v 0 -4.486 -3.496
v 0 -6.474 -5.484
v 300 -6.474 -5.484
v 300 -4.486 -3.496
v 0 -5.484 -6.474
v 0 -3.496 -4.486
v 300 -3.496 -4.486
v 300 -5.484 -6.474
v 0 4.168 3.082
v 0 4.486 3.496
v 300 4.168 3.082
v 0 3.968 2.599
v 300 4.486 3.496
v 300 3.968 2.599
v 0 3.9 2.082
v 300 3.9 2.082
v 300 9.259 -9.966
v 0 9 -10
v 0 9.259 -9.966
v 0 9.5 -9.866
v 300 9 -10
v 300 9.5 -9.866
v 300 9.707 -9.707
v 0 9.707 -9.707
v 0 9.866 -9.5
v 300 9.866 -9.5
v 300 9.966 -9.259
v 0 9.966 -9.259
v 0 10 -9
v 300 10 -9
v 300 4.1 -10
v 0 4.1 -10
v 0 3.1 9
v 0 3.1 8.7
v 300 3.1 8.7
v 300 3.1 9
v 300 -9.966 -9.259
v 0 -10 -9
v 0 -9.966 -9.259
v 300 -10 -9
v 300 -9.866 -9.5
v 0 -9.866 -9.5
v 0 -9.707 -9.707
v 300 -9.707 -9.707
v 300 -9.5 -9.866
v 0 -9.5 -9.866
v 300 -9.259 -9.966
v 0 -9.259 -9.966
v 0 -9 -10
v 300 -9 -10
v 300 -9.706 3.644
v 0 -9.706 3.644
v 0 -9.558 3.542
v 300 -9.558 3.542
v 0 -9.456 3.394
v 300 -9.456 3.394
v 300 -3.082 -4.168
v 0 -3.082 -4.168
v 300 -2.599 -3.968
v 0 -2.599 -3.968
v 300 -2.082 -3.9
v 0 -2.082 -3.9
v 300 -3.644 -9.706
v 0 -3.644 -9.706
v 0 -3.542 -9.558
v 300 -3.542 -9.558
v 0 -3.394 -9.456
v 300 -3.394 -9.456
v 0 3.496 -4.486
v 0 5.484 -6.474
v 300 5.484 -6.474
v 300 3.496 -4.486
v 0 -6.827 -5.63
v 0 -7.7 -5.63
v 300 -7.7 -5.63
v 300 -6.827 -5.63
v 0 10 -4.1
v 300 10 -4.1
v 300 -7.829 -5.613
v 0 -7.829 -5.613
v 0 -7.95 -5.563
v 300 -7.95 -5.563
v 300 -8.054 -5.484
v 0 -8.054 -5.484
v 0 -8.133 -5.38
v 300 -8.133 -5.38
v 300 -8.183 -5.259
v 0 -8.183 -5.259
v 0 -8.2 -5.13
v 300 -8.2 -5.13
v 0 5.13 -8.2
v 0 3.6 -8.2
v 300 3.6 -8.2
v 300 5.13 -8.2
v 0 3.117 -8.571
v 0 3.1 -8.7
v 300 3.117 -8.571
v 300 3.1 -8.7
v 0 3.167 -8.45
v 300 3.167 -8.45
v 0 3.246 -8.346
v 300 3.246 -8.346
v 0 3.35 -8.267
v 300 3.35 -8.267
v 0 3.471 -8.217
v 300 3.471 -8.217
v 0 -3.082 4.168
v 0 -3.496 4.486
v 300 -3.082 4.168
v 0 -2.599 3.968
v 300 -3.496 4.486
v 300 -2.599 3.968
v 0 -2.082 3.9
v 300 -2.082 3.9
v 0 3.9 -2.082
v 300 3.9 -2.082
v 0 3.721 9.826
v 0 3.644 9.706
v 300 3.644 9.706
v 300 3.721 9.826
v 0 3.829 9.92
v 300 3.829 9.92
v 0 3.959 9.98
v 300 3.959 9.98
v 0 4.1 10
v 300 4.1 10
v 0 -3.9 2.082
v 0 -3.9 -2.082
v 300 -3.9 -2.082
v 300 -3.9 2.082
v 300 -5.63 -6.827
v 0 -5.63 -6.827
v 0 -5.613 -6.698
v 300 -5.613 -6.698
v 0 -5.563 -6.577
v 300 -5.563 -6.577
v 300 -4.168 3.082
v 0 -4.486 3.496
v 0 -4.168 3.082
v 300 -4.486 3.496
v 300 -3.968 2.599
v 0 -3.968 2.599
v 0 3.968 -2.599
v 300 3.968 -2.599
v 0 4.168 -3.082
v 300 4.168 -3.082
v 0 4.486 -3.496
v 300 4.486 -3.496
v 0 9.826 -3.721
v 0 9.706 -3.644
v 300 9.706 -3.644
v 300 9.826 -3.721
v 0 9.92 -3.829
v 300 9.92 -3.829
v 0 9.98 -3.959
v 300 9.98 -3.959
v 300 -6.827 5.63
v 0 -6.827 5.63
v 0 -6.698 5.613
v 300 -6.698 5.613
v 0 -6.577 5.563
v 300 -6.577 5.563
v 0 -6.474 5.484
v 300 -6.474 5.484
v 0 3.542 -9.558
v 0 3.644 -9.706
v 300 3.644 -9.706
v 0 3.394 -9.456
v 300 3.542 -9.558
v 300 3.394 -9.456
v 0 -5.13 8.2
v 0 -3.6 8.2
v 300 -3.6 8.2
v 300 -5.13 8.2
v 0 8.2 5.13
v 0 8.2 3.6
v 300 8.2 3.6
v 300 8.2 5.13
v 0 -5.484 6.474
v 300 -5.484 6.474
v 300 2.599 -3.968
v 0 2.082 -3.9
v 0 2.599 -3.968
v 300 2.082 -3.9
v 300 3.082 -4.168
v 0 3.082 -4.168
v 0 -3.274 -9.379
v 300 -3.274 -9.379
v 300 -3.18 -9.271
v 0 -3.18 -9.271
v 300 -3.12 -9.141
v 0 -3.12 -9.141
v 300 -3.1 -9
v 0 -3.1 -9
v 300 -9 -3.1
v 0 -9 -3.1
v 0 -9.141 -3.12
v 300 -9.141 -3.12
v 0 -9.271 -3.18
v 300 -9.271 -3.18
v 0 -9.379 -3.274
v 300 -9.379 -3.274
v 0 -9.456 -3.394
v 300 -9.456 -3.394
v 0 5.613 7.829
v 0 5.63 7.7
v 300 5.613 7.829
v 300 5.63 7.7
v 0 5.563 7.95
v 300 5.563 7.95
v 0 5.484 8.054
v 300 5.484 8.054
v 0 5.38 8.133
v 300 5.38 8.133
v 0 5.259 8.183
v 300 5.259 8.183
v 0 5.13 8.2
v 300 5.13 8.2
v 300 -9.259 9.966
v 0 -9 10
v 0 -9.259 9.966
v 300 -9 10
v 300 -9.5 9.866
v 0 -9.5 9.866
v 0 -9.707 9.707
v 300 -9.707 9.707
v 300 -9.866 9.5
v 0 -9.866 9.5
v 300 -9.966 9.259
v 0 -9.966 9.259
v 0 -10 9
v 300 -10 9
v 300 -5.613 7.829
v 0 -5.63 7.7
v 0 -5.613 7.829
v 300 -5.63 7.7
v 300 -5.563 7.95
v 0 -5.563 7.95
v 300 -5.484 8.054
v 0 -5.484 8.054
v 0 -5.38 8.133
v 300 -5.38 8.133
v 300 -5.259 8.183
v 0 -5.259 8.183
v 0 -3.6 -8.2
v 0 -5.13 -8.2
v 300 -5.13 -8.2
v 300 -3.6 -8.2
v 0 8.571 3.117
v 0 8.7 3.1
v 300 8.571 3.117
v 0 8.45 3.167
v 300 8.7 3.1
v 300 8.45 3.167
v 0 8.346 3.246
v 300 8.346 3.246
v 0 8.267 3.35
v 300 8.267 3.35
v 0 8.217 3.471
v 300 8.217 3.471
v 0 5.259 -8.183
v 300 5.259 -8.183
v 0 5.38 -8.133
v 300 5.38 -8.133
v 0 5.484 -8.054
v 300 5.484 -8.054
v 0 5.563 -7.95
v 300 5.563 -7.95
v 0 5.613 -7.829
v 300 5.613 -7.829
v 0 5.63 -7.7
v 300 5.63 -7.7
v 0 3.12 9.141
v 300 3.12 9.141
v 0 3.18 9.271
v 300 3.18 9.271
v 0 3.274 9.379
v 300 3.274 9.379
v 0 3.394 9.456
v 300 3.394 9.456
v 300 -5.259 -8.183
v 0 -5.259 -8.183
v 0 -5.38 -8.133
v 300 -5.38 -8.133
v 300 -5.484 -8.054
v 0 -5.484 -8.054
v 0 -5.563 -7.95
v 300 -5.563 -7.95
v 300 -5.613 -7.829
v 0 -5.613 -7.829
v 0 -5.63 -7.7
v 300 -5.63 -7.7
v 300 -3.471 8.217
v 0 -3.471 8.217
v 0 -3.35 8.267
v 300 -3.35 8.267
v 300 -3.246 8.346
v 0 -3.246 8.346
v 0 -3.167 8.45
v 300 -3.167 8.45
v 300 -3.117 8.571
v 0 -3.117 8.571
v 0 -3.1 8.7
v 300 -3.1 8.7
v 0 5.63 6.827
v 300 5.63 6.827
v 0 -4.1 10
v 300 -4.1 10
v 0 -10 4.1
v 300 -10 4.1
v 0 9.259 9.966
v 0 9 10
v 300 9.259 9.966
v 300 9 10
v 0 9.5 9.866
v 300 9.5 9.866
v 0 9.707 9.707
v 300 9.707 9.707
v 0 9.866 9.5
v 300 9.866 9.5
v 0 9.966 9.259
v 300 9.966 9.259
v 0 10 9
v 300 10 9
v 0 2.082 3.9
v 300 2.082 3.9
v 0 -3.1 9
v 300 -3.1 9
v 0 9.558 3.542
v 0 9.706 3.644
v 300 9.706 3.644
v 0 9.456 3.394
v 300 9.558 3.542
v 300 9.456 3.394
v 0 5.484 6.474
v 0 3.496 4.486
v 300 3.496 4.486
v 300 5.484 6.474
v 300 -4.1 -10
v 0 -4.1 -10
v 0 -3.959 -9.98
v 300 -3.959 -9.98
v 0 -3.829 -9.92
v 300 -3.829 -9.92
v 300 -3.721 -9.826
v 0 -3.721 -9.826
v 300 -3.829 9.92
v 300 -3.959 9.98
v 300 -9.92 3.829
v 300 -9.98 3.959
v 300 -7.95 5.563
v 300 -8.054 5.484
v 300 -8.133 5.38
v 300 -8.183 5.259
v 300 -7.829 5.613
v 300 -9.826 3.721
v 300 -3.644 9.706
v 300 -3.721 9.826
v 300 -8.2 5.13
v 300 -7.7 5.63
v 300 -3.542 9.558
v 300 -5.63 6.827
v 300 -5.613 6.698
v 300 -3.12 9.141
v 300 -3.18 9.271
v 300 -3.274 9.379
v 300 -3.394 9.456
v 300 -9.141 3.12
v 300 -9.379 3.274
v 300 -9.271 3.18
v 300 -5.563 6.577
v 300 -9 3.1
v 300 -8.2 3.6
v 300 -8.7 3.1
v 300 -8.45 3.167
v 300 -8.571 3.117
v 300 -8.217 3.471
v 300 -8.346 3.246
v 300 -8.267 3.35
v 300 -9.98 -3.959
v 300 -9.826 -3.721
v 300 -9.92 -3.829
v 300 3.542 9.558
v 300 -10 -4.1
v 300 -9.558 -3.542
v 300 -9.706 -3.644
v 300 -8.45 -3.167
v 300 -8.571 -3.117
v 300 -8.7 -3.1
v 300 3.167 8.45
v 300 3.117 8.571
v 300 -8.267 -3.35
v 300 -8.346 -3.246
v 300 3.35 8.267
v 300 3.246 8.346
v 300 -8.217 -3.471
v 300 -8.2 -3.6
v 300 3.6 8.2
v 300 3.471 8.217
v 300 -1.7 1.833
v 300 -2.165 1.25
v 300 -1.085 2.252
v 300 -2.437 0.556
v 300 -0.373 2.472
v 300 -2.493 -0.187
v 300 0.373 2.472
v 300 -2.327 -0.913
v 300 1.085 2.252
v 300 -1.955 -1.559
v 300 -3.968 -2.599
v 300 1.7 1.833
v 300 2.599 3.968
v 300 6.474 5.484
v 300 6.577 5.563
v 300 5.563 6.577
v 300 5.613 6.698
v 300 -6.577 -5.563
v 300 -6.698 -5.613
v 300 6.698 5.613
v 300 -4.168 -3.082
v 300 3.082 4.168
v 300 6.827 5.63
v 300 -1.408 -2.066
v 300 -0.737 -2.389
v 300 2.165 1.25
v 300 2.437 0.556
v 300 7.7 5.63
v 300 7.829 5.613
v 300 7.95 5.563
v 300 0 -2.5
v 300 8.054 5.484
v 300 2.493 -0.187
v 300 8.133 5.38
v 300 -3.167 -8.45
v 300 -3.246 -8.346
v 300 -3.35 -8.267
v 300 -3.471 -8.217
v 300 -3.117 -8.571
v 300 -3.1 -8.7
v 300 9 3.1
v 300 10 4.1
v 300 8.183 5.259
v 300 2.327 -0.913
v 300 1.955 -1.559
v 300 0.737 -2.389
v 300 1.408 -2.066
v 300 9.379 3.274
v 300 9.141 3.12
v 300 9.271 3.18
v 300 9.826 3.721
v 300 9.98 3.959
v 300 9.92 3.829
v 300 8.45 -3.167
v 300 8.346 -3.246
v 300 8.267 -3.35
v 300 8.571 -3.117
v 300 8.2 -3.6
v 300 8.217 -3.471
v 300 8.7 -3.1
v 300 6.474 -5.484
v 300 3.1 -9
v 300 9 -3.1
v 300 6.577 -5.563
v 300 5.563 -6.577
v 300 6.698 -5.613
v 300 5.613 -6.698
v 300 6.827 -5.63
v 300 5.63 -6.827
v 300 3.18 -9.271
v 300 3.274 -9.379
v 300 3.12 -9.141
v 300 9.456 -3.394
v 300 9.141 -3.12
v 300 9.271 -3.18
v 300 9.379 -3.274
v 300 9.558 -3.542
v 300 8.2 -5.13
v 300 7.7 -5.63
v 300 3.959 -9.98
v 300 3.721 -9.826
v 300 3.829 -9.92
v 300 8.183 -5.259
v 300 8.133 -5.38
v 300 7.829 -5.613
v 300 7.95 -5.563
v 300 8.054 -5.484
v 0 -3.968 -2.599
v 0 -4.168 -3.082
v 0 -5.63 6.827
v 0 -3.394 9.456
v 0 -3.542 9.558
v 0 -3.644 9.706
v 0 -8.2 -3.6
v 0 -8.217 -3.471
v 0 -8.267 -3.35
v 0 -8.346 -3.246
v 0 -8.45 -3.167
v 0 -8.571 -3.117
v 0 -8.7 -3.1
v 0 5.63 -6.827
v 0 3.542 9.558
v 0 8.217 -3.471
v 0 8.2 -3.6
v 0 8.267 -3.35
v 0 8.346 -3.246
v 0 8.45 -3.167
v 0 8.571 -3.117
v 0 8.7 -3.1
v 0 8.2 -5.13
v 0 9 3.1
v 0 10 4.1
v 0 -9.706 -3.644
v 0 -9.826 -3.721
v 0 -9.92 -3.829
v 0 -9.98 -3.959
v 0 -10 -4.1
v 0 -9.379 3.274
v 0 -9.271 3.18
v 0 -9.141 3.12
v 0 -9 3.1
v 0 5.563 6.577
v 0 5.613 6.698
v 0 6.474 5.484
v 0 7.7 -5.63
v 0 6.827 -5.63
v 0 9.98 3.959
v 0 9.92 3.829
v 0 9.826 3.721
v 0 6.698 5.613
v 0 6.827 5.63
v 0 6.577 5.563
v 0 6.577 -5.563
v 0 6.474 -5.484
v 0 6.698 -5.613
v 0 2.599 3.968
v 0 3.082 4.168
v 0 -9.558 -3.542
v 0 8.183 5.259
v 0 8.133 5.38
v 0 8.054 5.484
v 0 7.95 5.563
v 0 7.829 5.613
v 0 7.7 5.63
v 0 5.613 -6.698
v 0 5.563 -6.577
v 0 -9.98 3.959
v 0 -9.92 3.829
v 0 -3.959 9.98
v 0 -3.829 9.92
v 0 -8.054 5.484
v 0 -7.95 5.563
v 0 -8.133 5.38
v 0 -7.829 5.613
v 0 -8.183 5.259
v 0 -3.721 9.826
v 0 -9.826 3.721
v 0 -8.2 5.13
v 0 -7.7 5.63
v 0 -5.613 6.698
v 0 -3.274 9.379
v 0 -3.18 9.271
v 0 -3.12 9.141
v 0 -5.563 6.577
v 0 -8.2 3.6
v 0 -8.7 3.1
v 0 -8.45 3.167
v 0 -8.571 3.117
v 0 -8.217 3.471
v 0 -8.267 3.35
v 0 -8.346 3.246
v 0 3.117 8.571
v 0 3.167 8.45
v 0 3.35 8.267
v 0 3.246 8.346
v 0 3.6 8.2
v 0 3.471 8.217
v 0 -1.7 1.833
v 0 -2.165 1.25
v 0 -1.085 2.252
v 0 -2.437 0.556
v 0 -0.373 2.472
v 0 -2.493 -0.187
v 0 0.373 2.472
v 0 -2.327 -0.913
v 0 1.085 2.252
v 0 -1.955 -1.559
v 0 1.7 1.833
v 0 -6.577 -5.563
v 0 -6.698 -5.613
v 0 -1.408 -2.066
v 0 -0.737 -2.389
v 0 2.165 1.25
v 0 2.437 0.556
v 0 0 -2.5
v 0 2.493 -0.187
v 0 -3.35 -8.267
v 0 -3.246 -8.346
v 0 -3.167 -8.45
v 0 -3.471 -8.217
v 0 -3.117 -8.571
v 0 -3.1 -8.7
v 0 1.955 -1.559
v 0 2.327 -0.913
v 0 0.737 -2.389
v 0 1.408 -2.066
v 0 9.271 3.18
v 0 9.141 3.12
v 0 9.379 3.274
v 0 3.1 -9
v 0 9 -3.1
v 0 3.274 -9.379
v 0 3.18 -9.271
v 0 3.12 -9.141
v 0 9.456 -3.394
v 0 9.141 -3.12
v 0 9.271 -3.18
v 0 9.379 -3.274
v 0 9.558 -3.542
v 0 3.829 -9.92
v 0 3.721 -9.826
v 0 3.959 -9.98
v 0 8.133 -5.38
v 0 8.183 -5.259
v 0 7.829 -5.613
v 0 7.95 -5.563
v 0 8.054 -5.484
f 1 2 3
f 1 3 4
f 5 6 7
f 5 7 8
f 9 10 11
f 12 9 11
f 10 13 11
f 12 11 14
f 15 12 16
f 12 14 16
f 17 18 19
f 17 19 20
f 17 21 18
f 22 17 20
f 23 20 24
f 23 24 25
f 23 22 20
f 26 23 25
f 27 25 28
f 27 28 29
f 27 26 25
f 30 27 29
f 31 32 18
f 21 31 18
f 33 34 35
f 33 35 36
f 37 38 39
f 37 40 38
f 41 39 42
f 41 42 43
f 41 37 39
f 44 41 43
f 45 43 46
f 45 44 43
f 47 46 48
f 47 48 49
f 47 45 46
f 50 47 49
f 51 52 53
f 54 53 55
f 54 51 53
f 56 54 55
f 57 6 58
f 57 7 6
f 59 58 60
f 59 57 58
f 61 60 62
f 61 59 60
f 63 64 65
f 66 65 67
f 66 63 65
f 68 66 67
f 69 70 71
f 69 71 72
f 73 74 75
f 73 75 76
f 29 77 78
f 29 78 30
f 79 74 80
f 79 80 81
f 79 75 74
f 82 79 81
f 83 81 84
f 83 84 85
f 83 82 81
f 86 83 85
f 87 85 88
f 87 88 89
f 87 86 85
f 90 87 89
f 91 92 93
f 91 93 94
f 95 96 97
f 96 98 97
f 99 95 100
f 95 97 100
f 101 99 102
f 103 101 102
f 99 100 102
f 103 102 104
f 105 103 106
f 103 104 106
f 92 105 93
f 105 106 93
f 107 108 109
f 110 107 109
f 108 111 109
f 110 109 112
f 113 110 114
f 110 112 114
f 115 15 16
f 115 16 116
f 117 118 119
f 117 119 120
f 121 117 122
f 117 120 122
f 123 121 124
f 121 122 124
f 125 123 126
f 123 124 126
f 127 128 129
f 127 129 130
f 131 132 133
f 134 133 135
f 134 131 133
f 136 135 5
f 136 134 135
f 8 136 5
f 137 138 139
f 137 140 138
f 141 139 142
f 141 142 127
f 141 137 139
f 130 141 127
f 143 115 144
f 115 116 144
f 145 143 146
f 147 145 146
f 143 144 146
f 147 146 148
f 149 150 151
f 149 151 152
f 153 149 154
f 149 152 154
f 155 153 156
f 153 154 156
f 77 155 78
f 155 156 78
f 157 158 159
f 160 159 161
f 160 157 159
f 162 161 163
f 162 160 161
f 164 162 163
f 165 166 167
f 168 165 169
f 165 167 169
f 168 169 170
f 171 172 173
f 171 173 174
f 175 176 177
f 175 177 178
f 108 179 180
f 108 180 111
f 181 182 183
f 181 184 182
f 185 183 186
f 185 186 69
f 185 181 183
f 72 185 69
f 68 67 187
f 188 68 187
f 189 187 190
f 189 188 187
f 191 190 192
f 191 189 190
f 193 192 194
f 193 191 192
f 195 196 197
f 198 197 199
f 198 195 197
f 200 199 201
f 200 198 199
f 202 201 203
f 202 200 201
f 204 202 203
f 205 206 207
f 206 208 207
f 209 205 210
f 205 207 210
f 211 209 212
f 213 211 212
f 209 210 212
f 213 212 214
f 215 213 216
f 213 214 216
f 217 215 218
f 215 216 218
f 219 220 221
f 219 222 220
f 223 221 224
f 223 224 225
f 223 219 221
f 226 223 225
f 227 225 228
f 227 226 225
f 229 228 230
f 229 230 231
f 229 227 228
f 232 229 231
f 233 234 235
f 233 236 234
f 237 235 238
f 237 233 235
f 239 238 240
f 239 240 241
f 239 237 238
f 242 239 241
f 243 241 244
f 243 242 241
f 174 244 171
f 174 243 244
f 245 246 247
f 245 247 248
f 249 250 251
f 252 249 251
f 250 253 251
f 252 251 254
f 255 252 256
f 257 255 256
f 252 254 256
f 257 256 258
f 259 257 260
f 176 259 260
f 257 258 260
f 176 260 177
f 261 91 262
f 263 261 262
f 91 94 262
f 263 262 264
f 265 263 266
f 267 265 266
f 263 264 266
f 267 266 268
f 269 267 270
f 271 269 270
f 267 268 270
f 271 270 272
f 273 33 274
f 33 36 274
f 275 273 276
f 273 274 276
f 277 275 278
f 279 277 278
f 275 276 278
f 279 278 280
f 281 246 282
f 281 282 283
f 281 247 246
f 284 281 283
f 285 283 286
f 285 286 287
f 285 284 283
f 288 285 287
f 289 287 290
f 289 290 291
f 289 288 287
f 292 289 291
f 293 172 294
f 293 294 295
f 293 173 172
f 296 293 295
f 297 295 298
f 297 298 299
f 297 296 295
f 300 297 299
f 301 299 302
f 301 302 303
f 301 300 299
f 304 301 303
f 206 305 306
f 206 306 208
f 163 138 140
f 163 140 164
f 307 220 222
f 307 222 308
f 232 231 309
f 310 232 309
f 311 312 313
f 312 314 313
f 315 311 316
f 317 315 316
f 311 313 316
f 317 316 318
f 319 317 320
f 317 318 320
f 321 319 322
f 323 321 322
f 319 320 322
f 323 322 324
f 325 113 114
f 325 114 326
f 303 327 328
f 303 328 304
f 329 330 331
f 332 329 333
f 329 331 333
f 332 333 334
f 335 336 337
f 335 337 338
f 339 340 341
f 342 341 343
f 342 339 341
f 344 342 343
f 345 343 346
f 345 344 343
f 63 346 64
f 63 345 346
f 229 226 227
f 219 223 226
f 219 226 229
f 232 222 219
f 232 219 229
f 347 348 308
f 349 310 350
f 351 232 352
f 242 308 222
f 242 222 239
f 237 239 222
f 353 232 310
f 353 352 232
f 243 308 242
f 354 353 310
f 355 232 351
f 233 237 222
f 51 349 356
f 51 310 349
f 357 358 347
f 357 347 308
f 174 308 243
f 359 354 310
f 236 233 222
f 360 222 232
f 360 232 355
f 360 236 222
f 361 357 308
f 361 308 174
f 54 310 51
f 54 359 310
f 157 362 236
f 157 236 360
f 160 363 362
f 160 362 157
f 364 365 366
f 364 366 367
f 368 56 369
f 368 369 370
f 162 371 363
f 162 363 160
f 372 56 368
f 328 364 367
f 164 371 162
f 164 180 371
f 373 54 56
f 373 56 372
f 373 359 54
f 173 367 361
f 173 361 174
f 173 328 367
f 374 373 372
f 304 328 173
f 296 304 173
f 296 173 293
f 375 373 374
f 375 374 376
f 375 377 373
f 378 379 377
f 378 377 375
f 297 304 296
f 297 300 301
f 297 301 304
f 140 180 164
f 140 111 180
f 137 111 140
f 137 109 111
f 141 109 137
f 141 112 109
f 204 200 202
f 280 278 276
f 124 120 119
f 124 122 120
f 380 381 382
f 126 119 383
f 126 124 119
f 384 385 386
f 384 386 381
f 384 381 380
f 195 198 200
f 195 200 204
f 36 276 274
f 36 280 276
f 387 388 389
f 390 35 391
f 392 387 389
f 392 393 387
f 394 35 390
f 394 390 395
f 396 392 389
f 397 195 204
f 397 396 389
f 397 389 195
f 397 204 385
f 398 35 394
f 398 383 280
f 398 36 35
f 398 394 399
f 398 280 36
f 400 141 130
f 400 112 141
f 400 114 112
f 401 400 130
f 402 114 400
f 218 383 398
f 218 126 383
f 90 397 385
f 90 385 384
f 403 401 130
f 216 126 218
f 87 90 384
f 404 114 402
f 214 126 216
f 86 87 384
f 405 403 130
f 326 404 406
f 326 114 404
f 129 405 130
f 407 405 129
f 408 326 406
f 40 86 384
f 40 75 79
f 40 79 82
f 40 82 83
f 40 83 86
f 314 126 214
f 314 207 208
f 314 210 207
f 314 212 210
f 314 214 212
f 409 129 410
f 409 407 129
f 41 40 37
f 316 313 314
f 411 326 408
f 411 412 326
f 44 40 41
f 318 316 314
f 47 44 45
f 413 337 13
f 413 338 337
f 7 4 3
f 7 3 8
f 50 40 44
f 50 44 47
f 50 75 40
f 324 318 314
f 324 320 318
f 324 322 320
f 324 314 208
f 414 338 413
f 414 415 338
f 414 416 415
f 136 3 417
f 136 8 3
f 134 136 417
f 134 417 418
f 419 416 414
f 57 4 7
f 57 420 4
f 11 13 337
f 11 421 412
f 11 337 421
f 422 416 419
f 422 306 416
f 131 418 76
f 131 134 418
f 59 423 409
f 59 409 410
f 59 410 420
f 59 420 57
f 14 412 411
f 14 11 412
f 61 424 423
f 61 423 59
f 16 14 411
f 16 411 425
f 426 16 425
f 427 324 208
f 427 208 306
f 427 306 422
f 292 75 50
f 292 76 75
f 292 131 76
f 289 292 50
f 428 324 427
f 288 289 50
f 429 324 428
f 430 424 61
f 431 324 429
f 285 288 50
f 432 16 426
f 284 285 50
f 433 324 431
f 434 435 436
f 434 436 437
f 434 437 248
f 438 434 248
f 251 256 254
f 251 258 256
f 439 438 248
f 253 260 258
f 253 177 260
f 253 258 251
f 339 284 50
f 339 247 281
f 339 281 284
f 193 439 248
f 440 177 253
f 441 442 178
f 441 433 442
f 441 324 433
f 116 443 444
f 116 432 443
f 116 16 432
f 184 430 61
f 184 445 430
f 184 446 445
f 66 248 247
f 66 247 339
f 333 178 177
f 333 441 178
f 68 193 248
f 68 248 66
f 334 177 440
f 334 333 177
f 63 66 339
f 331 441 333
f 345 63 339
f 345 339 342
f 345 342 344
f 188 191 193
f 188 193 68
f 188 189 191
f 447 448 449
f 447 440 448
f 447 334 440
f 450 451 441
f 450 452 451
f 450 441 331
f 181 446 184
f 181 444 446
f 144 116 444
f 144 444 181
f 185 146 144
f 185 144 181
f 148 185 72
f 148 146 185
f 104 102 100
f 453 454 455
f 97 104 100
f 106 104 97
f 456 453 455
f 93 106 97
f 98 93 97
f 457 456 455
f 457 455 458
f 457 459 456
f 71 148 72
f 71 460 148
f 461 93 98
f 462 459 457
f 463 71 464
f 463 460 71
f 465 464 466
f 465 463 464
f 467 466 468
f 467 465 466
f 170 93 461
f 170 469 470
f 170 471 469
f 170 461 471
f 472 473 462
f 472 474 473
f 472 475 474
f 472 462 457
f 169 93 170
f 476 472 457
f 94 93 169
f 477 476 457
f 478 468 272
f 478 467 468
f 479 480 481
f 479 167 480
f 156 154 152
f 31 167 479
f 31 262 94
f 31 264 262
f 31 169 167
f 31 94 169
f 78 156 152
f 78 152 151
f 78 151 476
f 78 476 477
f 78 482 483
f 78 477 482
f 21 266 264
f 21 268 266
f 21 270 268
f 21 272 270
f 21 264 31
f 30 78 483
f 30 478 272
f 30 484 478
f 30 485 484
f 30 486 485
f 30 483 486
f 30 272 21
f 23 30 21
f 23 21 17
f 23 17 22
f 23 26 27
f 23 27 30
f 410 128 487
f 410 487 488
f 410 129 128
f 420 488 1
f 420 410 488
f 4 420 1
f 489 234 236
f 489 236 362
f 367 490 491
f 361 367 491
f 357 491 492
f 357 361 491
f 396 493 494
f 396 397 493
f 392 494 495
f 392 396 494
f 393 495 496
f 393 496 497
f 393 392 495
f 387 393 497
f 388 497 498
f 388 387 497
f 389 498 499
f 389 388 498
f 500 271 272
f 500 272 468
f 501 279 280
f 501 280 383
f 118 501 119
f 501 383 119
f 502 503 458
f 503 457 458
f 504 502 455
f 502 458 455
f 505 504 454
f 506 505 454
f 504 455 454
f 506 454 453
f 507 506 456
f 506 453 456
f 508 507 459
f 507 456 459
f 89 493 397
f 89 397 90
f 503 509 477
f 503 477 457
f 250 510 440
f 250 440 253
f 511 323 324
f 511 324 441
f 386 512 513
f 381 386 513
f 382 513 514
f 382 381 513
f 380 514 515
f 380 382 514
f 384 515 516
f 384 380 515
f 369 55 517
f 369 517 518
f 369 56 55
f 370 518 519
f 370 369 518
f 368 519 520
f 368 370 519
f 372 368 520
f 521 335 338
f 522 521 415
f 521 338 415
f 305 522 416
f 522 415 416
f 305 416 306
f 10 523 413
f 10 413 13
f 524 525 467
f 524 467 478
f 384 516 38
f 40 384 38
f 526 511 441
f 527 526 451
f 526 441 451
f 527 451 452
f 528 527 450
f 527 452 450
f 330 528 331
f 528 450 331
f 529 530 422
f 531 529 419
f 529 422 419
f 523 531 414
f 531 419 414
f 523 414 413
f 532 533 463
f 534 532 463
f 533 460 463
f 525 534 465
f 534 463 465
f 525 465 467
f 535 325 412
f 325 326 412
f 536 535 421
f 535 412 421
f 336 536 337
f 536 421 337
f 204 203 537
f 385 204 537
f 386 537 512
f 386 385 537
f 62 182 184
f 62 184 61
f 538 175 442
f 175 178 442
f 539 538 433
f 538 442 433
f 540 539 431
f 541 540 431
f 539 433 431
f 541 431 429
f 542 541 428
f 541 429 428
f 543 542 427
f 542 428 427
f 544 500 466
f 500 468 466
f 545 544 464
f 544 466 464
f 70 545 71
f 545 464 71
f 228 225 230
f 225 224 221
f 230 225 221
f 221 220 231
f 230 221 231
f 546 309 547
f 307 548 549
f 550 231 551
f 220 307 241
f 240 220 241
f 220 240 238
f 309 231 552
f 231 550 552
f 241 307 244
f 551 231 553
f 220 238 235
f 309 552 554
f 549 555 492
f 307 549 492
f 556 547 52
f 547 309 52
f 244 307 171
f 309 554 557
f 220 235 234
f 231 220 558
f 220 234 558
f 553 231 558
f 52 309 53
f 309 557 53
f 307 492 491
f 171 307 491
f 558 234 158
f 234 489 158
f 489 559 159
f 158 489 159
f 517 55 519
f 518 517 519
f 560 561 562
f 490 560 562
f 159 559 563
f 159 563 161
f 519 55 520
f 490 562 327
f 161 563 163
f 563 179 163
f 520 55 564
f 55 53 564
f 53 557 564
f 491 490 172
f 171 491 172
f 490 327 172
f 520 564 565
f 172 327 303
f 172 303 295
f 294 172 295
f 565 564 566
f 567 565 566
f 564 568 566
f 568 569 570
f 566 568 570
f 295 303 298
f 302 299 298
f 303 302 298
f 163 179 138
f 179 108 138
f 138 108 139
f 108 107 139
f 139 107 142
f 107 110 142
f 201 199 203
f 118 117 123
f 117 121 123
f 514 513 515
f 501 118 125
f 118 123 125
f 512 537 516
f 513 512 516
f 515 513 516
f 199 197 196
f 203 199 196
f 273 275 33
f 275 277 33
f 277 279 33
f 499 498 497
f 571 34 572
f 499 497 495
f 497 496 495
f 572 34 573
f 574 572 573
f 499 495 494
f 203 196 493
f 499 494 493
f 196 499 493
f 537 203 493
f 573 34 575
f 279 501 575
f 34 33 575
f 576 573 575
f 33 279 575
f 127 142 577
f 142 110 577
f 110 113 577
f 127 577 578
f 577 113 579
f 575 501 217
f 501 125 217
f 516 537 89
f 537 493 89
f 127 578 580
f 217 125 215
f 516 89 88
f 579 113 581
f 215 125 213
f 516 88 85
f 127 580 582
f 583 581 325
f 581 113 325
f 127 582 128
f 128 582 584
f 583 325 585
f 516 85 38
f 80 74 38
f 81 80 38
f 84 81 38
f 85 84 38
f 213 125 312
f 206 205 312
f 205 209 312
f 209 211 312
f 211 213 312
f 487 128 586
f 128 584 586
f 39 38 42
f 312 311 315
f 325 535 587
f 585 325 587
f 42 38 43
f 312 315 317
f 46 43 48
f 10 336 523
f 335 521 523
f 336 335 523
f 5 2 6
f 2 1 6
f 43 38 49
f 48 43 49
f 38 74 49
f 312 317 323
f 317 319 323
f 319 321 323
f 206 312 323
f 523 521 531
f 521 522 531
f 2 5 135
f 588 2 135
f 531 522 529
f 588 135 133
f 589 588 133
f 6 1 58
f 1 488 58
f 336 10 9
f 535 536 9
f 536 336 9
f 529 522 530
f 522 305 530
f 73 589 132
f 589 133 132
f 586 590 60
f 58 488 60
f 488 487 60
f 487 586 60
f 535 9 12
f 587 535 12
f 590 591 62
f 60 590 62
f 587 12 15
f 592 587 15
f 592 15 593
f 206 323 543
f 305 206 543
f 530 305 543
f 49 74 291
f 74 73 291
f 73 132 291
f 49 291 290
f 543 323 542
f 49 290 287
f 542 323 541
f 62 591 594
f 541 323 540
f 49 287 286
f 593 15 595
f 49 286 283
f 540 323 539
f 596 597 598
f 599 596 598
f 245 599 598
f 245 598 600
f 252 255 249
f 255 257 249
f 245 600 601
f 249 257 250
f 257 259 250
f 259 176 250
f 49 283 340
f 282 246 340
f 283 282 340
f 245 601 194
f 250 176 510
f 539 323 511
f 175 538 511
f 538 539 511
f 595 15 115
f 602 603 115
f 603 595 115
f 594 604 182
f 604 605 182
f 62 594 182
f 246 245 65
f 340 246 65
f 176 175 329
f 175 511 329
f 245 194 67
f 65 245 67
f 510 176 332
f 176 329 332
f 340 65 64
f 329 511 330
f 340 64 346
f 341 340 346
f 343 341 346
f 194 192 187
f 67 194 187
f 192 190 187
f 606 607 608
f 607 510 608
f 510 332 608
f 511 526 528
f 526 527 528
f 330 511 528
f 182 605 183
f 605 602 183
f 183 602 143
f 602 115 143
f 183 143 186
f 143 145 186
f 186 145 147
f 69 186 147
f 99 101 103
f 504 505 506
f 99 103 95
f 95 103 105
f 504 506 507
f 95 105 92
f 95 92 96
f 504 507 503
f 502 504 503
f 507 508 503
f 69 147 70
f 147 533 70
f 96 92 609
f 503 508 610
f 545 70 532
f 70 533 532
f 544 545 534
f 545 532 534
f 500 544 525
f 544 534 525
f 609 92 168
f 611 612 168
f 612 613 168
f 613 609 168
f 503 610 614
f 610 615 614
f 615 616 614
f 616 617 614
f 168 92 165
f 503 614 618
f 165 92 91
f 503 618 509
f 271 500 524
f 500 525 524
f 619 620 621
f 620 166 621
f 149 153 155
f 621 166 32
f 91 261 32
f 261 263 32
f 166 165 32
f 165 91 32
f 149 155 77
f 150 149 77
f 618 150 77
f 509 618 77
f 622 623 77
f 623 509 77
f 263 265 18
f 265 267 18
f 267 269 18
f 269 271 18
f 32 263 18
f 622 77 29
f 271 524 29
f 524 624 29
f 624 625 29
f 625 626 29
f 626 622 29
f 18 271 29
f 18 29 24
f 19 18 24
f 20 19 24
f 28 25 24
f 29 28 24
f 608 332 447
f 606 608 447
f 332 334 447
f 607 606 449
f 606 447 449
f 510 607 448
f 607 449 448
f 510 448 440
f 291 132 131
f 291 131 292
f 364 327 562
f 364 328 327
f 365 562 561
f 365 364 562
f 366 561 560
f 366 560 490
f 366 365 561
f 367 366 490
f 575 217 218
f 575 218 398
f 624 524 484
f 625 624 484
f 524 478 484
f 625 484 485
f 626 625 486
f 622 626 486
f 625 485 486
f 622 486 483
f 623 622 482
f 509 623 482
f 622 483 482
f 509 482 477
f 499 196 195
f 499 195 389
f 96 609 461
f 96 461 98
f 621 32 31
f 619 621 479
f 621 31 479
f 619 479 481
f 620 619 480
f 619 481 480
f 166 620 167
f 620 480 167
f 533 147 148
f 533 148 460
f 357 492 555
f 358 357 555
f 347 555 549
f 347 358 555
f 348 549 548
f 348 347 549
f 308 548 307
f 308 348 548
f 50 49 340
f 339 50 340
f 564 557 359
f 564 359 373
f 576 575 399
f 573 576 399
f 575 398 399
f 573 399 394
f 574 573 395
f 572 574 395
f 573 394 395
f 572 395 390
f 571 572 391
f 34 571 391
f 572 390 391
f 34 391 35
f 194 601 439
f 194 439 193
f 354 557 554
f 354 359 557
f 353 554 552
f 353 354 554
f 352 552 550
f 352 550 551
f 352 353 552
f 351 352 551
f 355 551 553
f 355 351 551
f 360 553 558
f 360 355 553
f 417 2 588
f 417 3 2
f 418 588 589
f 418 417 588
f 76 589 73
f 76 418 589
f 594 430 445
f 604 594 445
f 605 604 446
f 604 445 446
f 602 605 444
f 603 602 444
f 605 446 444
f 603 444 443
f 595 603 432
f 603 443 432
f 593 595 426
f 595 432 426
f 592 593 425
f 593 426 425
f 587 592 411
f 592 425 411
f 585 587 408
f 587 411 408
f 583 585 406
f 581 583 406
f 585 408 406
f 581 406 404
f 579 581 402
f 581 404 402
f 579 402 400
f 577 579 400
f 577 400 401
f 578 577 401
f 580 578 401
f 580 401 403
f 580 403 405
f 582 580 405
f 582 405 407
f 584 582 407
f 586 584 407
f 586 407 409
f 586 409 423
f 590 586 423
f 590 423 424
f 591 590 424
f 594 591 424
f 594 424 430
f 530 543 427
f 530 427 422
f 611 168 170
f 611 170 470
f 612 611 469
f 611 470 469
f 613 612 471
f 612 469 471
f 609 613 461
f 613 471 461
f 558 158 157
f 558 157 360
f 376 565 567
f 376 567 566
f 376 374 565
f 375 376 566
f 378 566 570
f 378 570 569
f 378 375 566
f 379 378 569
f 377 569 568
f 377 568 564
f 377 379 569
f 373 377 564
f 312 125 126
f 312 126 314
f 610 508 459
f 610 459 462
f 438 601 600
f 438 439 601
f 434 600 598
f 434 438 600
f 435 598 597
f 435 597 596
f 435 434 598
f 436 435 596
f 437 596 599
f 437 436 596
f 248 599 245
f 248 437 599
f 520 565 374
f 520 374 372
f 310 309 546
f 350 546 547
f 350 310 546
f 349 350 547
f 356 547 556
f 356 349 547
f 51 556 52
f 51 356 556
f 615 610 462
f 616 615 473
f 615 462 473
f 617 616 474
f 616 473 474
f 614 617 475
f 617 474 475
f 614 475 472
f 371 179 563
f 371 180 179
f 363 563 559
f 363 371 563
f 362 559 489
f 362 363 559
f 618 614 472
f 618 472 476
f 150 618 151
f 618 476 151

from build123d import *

# Parameters (mm, degrees)
SKETCH1_W                = 20
SKETCH1_H                = 20
BOSS_EXTRUDE1_DEPTH      = 300
FILLET1_R                = 1
CUT_EXTRUDE1_DEPTH       = 301.333148354
F_5_0_5_DIAMETER_HOLE1_D = 5
FILLET2_R                = 2
FILLET3_R                = 0.5
FILLET4_R                = 0.5
FILLET5_R                = 0.5


with BuildPart() as part:
    # Sketch1 → Boss-Extrude1 (new body)
    with BuildSketch(Plane(origin=(0, 0, 0), x_dir=(0, 0, -1), z_dir=(1, 0, 0))):
        Rectangle(SKETCH1_W, SKETCH1_H)
    extrude(amount=BOSS_EXTRUDE1_DEPTH)

    # Fillet1
    fillet1_edges = [part.edges().sort_by_distance(p)[0] for p in [
        (150, 10, 10),
        (150, 10, -10),
        (150, -10, -10),
        (150, -10, 10),
    ]]
    fillet(fillet1_edges, radius=FILLET1_R)

    # Sketch3 → Cut-Extrude1 (cut, through all)
    with BuildSketch(Plane.ZY):
        Polygon((-3.6, 10), (3.6, 10), (3.6, 9.5), (3.1, 9.5), (3.1, 8.2), (5.63, 8.2), (5.63, 6.619949494), (2.910050506, 3.9), (-2.910050506, 3.9), (-5.63, 6.619949494), (-5.63, 8.2), (-3.1, 8.2), (-3.1, 9.5), (-3.6, 9.5), align=None)
        Polygon((10, 3.6), (10, -3.6), (9.5, -3.6), (9.5, -3.1), (8.2, -3.1), (8.2, -5.63), (6.619949494, -5.63), (3.9, -2.910050506), (3.9, 2.910050506), (6.619949494, 5.63), (8.2, 5.63), (8.2, 3.1), (9.5, 3.1), (9.5, 3.6), align=None)
        Polygon((3.6, -10), (-3.6, -10), (-3.6, -9.5), (-3.1, -9.5), (-3.1, -8.2), (-5.63, -8.2), (-5.63, -6.619949494), (-2.910050506, -3.9), (2.910050506, -3.9), (5.63, -6.619949494), (5.63, -8.2), (3.1, -8.2), (3.1, -9.5), (3.6, -9.5), align=None)
        Polygon((-10, -3.6), (-10, 3.6), (-9.5, 3.6), (-9.5, 3.1), (-8.2, 3.1), (-8.2, 5.63), (-6.619949494, 5.63), (-3.9, 2.910050506), (-3.9, -2.910050506), (-6.619949494, -5.63), (-8.2, -5.63), (-8.2, -3.1), (-9.5, -3.1), (-9.5, -3.6), align=None)
    extrude(amount=-CUT_EXTRUDE1_DEPTH, mode=Mode.SUBTRACT)

    # Ø5.0 (5) Diameter Hole1 (through all)
    with Locations(Plane.ZY):
        with Locations((0, 0)):
            Hole(F_5_0_5_DIAMETER_HOLE1_D / 2)

    # Fillet2
    fillet2_edges = [part.edges().sort_by_distance(p)[0] for p in [
        (150, -3.9, -2.910050506),
        (150, -3.9, 2.910050506),
        (150, 2.910050506, -3.9),
        (150, -2.910050506, -3.9),
        (150, -2.910050506, 3.9),
        (150, 2.910050506, 3.9),
        (150, 3.9, 2.910050506),
        (150, 3.9, -2.910050506),
    ]]
    fillet(fillet2_edges, radius=FILLET2_R)

    # Fillet3
    fillet3_edges = [part.edges().sort_by_distance(p)[0] for p in [
        (150, 3.6, -10),
        (150, 3.1, -9.5),
        (150, 3.1, -8.2),
        (150, 5.63, -8.2),
        (150, 5.63, -6.619949494),
        (150, 3.6, 10),
        (150, 3.1, 9.5),
        (150, 3.1, 8.2),
        (150, 5.63, 8.2),
        (150, 5.63, 6.619949494),
        (150, 6.619949494, 5.63),
        (150, 8.2, 5.63),
        (150, 8.2, 3.1),
        (150, 9.5, 3.1),
        (150, 10, 3.6),
        (150, 9.5, -3.1),
        (150, 10, -3.6),
        (150, 8.2, -3.1),
        (150, 8.2, -5.63),
        (150, 6.619949494, -5.63),
    ]]
    fillet(fillet3_edges, radius=FILLET3_R - 0.0001)  # a hair under: the kernel refuses the full size

    # Fillet4
    fillet4_edges = [part.edges().sort_by_distance(p)[0] for p in [
        (150, -3.6, 10),
        (150, -3.1, 9.5),
        (150, -3.1, 8.2),
        (150, -5.63, 8.2),
        (150, -5.63, 6.619949494),
        (150, -6.619949494, 5.63),
        (150, -8.2, 5.63),
        (150, -8.2, 3.1),
        (150, -10, 3.6),
        (150, -9.5, 3.1),
        (150, -10, -3.6),
        (150, -9.5, -3.1),
        (150, -8.2, -3.1),
        (150, -8.2, -5.63),
        (150, -6.619949494, -5.63),
        (150, -5.63, -6.619949494),
        (150, -5.63, -8.2),
        (150, -3.1, -8.2),
        (150, -3.1, -9.5),
        (150, -3.6, -10),
    ]]
    fillet(fillet4_edges, radius=FILLET4_R - 0.0001)  # a hair under: the kernel refuses the full size

    # Fillet5
    fillet5_edges = [part.edges().sort_by_distance(p)[0] for p in [
        (150, 3.6, 9.5),
        (150, 9.5, 3.6),
        (150, 9.5, -3.6),
        (150, 3.6, -9.5),
        (150, -3.6, 9.5),
        (150, -9.5, 3.6),
        (150, -9.5, -3.6),
        (150, -3.6, -9.5),
    ]]
    fillet(fillet5_edges, radius=FILLET5_R)


solid = part.part
